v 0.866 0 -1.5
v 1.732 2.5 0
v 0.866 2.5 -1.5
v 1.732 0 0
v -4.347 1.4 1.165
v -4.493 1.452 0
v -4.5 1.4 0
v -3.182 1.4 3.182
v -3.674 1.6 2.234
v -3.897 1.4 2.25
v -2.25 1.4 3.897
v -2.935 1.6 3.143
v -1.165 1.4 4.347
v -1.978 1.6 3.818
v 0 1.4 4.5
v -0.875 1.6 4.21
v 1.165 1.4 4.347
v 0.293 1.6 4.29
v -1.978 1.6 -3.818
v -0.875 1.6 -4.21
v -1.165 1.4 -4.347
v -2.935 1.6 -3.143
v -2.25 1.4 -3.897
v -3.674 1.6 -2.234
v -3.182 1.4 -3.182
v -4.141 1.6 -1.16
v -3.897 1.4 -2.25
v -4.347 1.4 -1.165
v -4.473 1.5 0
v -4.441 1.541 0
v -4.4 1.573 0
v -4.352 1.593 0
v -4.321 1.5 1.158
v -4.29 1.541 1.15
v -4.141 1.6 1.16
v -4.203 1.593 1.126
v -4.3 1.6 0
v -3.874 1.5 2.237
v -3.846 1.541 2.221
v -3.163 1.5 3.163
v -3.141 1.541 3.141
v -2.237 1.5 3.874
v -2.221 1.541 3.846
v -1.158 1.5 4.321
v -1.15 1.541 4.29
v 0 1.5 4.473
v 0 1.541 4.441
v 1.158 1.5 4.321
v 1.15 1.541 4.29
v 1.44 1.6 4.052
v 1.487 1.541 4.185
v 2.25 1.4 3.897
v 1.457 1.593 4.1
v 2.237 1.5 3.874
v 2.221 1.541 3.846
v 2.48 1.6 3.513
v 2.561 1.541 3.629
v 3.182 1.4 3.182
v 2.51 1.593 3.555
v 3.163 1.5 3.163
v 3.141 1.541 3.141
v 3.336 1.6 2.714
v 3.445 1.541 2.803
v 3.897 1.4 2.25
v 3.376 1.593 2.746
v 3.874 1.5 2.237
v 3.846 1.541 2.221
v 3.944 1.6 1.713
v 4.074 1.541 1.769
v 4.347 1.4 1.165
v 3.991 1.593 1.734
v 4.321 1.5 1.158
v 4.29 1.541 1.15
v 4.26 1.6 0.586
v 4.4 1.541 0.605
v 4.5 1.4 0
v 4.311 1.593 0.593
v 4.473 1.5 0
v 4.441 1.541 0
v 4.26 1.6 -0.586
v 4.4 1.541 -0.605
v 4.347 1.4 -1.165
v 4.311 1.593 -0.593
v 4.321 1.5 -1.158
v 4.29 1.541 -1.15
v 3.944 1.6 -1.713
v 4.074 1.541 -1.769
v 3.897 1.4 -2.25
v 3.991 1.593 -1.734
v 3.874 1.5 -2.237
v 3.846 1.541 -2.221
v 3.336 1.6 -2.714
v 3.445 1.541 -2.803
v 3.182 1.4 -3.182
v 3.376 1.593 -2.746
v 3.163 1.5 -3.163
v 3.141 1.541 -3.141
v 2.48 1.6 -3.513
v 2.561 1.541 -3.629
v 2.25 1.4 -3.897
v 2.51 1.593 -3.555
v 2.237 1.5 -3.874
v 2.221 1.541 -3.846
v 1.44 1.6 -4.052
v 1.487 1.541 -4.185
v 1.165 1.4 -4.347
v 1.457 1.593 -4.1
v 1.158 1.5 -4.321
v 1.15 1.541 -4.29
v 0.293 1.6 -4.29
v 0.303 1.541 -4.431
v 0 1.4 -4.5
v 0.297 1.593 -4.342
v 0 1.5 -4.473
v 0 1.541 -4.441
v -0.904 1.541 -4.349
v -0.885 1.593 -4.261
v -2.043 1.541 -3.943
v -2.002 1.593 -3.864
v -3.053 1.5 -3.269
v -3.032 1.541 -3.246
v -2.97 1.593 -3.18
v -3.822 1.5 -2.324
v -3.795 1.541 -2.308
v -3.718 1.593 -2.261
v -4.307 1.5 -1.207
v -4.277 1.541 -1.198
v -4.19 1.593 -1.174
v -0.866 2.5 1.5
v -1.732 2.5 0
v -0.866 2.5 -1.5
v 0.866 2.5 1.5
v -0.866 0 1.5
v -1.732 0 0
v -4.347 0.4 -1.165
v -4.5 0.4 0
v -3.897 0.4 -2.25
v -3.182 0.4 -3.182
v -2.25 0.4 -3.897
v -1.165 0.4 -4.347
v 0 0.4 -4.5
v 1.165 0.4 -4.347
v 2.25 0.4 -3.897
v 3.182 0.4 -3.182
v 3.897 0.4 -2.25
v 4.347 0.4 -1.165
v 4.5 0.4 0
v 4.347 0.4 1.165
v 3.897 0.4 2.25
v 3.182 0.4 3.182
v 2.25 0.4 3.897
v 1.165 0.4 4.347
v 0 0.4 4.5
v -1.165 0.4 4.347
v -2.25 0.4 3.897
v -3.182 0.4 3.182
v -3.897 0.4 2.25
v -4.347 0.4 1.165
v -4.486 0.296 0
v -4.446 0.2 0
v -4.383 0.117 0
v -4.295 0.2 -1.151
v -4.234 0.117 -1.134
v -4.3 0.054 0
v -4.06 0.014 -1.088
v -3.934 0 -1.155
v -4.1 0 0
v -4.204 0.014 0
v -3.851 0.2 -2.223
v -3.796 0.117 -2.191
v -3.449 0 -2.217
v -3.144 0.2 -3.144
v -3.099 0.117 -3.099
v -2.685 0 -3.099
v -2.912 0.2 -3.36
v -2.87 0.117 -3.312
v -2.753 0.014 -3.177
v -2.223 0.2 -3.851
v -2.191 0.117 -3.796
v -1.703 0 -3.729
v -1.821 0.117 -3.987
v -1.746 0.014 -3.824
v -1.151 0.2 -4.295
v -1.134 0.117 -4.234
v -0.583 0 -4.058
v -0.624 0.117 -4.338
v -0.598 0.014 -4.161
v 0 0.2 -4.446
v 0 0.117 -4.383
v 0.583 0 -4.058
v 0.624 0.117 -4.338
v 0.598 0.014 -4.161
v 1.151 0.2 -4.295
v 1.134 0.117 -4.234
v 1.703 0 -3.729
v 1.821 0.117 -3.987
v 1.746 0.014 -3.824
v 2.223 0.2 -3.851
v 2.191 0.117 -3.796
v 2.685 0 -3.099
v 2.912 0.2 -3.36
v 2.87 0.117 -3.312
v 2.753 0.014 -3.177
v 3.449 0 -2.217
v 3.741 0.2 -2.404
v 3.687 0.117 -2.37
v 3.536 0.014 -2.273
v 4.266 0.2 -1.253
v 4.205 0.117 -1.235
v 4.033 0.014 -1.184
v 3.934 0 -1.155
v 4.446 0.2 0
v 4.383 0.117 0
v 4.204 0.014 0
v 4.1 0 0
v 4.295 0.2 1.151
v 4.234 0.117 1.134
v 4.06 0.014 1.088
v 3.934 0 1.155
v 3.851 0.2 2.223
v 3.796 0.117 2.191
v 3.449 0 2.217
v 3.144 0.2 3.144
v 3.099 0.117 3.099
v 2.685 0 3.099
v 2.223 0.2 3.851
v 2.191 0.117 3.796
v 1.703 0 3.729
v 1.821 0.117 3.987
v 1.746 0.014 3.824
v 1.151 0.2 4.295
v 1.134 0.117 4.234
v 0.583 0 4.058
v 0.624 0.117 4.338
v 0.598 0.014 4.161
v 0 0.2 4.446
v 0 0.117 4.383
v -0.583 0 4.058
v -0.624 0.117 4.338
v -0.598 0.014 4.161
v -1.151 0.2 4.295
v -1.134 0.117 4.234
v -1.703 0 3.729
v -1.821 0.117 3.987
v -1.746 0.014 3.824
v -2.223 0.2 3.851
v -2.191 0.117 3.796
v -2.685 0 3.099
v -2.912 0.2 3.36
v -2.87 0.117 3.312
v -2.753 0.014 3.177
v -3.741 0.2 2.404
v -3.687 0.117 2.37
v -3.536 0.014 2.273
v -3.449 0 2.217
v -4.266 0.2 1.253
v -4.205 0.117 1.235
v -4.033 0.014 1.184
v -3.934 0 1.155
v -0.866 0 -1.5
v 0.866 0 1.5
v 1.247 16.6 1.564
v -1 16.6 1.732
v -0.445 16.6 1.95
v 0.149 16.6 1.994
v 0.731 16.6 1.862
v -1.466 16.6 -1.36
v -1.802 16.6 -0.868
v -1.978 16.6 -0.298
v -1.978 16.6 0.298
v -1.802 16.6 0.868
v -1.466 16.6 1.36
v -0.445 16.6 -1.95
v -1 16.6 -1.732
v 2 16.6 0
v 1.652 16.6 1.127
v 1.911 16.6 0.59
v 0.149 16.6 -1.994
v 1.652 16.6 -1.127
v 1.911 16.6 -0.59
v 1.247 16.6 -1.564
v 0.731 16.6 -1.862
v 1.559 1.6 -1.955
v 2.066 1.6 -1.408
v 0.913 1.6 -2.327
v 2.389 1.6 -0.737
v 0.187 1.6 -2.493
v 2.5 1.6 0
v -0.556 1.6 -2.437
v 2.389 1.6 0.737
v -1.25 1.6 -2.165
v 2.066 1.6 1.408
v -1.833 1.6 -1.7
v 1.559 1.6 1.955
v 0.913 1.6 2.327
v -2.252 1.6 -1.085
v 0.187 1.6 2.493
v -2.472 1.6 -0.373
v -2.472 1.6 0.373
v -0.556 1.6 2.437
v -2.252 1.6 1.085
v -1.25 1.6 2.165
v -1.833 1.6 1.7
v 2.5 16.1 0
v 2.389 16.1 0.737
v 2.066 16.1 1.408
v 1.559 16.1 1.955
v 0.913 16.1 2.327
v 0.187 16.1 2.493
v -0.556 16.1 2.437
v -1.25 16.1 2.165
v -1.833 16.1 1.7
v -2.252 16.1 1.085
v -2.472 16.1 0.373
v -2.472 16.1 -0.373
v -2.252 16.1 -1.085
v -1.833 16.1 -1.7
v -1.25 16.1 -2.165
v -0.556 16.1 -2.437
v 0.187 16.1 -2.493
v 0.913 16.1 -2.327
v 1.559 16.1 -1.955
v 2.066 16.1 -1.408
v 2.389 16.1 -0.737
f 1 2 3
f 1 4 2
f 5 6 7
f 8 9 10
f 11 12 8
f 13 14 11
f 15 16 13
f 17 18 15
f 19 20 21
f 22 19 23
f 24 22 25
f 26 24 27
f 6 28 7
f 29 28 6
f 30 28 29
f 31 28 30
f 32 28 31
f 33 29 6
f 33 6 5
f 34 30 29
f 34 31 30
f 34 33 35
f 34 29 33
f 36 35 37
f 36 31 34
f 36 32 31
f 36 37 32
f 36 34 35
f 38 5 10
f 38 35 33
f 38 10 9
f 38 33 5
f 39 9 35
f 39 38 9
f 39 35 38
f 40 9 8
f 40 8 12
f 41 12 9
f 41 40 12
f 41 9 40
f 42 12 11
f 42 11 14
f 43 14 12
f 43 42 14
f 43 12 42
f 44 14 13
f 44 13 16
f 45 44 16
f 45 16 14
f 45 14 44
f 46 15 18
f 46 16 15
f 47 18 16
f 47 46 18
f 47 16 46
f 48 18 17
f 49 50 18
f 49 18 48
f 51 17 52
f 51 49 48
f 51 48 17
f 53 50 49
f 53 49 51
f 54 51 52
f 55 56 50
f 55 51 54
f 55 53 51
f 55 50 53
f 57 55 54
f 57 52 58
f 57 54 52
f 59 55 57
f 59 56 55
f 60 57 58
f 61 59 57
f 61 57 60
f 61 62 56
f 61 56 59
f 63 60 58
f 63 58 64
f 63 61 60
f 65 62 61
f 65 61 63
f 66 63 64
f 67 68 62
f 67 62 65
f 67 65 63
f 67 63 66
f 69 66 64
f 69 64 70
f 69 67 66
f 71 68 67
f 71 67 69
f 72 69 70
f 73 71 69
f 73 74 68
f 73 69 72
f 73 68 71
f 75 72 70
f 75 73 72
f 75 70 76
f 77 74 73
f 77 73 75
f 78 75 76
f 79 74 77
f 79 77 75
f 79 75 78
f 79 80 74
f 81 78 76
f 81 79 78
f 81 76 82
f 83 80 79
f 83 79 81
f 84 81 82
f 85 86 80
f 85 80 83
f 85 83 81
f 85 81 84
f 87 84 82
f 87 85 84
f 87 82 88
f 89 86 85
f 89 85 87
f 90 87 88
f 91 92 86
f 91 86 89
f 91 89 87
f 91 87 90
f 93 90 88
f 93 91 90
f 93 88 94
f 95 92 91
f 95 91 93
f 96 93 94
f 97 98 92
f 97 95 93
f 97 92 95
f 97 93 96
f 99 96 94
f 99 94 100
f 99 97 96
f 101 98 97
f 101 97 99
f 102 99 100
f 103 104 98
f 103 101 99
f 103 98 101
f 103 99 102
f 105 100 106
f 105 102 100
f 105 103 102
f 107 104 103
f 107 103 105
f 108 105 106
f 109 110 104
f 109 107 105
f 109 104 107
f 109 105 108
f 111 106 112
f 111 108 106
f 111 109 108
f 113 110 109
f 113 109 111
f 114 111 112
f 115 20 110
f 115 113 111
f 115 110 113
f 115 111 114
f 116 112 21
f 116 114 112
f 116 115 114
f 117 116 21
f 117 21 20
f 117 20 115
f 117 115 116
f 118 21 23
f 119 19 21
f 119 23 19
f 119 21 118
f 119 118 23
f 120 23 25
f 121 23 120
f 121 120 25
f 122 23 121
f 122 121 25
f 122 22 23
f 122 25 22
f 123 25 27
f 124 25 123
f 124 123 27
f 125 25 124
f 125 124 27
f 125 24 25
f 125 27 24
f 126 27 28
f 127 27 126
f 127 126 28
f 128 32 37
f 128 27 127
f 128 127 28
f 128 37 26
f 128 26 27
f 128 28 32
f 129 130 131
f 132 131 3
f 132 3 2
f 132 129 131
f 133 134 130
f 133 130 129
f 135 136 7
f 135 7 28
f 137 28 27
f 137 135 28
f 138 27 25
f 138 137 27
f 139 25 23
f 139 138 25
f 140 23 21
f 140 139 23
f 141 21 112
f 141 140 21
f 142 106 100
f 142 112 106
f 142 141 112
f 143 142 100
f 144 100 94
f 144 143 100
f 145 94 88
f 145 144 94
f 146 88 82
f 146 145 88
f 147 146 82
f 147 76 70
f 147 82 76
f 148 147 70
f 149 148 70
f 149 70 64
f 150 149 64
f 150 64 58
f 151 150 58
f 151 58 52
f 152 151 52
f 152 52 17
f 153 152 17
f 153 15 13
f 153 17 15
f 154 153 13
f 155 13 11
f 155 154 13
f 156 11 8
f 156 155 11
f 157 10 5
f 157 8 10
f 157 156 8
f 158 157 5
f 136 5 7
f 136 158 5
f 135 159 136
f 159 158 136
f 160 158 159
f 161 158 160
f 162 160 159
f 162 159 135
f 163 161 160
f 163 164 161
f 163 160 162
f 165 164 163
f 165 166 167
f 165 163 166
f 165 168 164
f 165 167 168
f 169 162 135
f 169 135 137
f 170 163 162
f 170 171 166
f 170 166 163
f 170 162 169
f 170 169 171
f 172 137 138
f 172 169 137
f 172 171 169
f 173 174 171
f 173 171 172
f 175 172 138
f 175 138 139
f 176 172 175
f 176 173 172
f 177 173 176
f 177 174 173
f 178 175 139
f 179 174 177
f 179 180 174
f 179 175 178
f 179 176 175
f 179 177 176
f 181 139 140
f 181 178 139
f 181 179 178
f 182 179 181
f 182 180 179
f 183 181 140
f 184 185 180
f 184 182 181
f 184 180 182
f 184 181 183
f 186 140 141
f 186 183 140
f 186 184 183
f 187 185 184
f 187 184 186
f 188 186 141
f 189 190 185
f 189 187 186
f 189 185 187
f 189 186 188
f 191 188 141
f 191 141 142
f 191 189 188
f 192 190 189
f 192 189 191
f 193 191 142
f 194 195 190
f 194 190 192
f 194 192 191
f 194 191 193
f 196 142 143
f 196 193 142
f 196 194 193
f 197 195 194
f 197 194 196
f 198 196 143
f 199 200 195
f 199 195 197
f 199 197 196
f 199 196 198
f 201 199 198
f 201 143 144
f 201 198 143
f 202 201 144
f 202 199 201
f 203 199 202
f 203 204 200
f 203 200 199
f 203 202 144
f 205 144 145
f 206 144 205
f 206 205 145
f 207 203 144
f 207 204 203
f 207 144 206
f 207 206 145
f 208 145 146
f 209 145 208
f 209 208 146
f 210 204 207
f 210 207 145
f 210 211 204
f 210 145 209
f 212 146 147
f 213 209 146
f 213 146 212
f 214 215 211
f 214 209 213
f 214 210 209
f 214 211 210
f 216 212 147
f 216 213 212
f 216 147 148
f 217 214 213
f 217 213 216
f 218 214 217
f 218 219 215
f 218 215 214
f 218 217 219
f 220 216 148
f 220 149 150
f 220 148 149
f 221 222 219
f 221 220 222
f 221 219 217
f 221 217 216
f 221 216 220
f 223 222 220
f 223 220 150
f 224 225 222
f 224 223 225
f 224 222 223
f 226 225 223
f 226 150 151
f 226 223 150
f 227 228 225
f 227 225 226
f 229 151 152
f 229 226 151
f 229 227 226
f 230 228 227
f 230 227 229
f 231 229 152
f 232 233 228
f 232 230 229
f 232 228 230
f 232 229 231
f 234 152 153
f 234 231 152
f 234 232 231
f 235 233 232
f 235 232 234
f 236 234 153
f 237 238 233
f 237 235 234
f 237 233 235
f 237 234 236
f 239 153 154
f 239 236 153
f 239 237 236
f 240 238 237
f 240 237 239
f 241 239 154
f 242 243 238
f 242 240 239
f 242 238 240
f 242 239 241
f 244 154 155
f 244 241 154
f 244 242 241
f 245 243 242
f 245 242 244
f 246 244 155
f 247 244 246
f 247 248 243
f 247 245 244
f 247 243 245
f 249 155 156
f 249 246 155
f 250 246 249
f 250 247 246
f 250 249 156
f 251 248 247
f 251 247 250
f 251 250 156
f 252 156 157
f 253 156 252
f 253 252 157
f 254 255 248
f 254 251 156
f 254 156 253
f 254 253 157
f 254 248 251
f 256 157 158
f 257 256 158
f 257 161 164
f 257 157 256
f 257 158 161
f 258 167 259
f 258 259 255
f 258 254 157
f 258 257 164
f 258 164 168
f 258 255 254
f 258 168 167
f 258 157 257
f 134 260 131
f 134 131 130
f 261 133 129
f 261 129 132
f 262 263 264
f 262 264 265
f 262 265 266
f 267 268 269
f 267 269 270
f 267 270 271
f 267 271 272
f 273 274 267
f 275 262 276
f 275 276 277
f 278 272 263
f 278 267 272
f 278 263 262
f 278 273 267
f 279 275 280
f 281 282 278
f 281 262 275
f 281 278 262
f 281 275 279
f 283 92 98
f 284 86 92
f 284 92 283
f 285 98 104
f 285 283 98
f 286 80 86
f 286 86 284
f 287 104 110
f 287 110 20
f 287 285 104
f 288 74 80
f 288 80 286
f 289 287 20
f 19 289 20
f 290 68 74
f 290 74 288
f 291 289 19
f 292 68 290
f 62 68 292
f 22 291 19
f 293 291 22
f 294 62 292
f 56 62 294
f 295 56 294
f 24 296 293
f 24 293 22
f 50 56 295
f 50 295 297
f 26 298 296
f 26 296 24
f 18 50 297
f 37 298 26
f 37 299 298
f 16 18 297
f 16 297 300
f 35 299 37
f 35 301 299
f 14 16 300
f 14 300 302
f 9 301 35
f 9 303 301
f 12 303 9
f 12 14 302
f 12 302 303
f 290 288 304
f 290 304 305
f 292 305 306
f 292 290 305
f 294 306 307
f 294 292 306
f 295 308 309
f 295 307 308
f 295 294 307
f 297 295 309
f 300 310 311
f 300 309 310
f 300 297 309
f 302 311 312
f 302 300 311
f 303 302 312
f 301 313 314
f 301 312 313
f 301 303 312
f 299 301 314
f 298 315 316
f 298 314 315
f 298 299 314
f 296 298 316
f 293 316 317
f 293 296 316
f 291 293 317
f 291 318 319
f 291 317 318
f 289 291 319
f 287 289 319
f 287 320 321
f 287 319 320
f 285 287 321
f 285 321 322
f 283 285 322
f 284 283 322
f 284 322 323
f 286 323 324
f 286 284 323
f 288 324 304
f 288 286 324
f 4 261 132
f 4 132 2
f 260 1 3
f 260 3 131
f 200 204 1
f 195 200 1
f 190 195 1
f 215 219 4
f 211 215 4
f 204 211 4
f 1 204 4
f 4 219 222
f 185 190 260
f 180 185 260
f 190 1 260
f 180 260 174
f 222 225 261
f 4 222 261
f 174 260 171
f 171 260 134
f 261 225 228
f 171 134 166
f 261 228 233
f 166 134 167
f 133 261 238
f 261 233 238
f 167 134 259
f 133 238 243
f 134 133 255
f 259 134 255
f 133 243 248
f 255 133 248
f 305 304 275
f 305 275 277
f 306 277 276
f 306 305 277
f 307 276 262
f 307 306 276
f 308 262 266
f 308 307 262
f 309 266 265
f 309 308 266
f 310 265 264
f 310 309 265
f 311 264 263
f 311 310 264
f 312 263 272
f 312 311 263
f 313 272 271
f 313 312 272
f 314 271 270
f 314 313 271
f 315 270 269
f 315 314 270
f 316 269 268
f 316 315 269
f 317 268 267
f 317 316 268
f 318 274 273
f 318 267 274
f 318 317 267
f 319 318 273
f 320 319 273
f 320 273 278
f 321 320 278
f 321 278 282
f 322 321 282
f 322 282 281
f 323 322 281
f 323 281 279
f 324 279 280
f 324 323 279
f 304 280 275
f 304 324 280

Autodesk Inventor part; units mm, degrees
ref_plane "YZ Plane" through (0, 0, 0) normal (1, 0, 0) x (0, 1, 0)
ref_plane "XZ Plane" through (0, 0, 0) normal (0, 1, 0) x (-1, 0, 0)
ref_plane "XY Plane" through (0, 0, 0) normal (0, 0, 1) x (1, 0, 0)
sketch "Boceto1" plane through (0, 0, 0) normal (0, 1, 0) x (-1, 0, 0)
  circle A0 centre (0, 0) radius 4.5
  dimension "d0" = 9
extrude "Extrusión1" add sketch "Boceto1" along normal blind 1.6
sketch "Boceto2" plane through (0, 1.6, 0) normal (0, 1, 0) x (1, 0, 0)
  circle A0 centre (0, 0) radius 2.5
  dimension "d3" = 5
extrude "Extrusión2" add sketch "Boceto2" along normal blind 15
fillet "Empalme1" radius 0.4 1 edges at (4.5, 0, 0)
fillet "Empalme2" radius 0.2 1 edges at (4.5, 1.6, 0)
sketch "Boceto3" plane through (0, 0, 0) normal (0, -1, 0) x (1, 0, 0)
  line L0 (-1.7321, 0) -> (-0.866, 1.5)
  line L1 (-0.866, 1.5) -> (0.866, 1.5)
  line L2 (0.866, 1.5) -> (1.7321, 0)
  line L3 (1.7321, 0) -> (0.866, -1.5)
  line L4 (0.866, -1.5) -> (-0.866, -1.5)
  line L5 (-0.866, -1.5) -> (-1.7321, 0)
  point P0 (0, 0)
  point P1 (0, 0)
  dimension "d8" = 3
extrude "Extrusión3" cut sketch "Boceto3" against normal blind 2.5
chamfer "Chaflán1" distance 0.5 angle 45 1 edges at (-2.5, 16.6, 0)
thread "Rosca2" size "M5x0.8" class "6g" standard "ANSI Metric M Profile" length 12 offset 3
properties part number "Perno M5x15 cabeza plana_" material "Hierro, gris"
